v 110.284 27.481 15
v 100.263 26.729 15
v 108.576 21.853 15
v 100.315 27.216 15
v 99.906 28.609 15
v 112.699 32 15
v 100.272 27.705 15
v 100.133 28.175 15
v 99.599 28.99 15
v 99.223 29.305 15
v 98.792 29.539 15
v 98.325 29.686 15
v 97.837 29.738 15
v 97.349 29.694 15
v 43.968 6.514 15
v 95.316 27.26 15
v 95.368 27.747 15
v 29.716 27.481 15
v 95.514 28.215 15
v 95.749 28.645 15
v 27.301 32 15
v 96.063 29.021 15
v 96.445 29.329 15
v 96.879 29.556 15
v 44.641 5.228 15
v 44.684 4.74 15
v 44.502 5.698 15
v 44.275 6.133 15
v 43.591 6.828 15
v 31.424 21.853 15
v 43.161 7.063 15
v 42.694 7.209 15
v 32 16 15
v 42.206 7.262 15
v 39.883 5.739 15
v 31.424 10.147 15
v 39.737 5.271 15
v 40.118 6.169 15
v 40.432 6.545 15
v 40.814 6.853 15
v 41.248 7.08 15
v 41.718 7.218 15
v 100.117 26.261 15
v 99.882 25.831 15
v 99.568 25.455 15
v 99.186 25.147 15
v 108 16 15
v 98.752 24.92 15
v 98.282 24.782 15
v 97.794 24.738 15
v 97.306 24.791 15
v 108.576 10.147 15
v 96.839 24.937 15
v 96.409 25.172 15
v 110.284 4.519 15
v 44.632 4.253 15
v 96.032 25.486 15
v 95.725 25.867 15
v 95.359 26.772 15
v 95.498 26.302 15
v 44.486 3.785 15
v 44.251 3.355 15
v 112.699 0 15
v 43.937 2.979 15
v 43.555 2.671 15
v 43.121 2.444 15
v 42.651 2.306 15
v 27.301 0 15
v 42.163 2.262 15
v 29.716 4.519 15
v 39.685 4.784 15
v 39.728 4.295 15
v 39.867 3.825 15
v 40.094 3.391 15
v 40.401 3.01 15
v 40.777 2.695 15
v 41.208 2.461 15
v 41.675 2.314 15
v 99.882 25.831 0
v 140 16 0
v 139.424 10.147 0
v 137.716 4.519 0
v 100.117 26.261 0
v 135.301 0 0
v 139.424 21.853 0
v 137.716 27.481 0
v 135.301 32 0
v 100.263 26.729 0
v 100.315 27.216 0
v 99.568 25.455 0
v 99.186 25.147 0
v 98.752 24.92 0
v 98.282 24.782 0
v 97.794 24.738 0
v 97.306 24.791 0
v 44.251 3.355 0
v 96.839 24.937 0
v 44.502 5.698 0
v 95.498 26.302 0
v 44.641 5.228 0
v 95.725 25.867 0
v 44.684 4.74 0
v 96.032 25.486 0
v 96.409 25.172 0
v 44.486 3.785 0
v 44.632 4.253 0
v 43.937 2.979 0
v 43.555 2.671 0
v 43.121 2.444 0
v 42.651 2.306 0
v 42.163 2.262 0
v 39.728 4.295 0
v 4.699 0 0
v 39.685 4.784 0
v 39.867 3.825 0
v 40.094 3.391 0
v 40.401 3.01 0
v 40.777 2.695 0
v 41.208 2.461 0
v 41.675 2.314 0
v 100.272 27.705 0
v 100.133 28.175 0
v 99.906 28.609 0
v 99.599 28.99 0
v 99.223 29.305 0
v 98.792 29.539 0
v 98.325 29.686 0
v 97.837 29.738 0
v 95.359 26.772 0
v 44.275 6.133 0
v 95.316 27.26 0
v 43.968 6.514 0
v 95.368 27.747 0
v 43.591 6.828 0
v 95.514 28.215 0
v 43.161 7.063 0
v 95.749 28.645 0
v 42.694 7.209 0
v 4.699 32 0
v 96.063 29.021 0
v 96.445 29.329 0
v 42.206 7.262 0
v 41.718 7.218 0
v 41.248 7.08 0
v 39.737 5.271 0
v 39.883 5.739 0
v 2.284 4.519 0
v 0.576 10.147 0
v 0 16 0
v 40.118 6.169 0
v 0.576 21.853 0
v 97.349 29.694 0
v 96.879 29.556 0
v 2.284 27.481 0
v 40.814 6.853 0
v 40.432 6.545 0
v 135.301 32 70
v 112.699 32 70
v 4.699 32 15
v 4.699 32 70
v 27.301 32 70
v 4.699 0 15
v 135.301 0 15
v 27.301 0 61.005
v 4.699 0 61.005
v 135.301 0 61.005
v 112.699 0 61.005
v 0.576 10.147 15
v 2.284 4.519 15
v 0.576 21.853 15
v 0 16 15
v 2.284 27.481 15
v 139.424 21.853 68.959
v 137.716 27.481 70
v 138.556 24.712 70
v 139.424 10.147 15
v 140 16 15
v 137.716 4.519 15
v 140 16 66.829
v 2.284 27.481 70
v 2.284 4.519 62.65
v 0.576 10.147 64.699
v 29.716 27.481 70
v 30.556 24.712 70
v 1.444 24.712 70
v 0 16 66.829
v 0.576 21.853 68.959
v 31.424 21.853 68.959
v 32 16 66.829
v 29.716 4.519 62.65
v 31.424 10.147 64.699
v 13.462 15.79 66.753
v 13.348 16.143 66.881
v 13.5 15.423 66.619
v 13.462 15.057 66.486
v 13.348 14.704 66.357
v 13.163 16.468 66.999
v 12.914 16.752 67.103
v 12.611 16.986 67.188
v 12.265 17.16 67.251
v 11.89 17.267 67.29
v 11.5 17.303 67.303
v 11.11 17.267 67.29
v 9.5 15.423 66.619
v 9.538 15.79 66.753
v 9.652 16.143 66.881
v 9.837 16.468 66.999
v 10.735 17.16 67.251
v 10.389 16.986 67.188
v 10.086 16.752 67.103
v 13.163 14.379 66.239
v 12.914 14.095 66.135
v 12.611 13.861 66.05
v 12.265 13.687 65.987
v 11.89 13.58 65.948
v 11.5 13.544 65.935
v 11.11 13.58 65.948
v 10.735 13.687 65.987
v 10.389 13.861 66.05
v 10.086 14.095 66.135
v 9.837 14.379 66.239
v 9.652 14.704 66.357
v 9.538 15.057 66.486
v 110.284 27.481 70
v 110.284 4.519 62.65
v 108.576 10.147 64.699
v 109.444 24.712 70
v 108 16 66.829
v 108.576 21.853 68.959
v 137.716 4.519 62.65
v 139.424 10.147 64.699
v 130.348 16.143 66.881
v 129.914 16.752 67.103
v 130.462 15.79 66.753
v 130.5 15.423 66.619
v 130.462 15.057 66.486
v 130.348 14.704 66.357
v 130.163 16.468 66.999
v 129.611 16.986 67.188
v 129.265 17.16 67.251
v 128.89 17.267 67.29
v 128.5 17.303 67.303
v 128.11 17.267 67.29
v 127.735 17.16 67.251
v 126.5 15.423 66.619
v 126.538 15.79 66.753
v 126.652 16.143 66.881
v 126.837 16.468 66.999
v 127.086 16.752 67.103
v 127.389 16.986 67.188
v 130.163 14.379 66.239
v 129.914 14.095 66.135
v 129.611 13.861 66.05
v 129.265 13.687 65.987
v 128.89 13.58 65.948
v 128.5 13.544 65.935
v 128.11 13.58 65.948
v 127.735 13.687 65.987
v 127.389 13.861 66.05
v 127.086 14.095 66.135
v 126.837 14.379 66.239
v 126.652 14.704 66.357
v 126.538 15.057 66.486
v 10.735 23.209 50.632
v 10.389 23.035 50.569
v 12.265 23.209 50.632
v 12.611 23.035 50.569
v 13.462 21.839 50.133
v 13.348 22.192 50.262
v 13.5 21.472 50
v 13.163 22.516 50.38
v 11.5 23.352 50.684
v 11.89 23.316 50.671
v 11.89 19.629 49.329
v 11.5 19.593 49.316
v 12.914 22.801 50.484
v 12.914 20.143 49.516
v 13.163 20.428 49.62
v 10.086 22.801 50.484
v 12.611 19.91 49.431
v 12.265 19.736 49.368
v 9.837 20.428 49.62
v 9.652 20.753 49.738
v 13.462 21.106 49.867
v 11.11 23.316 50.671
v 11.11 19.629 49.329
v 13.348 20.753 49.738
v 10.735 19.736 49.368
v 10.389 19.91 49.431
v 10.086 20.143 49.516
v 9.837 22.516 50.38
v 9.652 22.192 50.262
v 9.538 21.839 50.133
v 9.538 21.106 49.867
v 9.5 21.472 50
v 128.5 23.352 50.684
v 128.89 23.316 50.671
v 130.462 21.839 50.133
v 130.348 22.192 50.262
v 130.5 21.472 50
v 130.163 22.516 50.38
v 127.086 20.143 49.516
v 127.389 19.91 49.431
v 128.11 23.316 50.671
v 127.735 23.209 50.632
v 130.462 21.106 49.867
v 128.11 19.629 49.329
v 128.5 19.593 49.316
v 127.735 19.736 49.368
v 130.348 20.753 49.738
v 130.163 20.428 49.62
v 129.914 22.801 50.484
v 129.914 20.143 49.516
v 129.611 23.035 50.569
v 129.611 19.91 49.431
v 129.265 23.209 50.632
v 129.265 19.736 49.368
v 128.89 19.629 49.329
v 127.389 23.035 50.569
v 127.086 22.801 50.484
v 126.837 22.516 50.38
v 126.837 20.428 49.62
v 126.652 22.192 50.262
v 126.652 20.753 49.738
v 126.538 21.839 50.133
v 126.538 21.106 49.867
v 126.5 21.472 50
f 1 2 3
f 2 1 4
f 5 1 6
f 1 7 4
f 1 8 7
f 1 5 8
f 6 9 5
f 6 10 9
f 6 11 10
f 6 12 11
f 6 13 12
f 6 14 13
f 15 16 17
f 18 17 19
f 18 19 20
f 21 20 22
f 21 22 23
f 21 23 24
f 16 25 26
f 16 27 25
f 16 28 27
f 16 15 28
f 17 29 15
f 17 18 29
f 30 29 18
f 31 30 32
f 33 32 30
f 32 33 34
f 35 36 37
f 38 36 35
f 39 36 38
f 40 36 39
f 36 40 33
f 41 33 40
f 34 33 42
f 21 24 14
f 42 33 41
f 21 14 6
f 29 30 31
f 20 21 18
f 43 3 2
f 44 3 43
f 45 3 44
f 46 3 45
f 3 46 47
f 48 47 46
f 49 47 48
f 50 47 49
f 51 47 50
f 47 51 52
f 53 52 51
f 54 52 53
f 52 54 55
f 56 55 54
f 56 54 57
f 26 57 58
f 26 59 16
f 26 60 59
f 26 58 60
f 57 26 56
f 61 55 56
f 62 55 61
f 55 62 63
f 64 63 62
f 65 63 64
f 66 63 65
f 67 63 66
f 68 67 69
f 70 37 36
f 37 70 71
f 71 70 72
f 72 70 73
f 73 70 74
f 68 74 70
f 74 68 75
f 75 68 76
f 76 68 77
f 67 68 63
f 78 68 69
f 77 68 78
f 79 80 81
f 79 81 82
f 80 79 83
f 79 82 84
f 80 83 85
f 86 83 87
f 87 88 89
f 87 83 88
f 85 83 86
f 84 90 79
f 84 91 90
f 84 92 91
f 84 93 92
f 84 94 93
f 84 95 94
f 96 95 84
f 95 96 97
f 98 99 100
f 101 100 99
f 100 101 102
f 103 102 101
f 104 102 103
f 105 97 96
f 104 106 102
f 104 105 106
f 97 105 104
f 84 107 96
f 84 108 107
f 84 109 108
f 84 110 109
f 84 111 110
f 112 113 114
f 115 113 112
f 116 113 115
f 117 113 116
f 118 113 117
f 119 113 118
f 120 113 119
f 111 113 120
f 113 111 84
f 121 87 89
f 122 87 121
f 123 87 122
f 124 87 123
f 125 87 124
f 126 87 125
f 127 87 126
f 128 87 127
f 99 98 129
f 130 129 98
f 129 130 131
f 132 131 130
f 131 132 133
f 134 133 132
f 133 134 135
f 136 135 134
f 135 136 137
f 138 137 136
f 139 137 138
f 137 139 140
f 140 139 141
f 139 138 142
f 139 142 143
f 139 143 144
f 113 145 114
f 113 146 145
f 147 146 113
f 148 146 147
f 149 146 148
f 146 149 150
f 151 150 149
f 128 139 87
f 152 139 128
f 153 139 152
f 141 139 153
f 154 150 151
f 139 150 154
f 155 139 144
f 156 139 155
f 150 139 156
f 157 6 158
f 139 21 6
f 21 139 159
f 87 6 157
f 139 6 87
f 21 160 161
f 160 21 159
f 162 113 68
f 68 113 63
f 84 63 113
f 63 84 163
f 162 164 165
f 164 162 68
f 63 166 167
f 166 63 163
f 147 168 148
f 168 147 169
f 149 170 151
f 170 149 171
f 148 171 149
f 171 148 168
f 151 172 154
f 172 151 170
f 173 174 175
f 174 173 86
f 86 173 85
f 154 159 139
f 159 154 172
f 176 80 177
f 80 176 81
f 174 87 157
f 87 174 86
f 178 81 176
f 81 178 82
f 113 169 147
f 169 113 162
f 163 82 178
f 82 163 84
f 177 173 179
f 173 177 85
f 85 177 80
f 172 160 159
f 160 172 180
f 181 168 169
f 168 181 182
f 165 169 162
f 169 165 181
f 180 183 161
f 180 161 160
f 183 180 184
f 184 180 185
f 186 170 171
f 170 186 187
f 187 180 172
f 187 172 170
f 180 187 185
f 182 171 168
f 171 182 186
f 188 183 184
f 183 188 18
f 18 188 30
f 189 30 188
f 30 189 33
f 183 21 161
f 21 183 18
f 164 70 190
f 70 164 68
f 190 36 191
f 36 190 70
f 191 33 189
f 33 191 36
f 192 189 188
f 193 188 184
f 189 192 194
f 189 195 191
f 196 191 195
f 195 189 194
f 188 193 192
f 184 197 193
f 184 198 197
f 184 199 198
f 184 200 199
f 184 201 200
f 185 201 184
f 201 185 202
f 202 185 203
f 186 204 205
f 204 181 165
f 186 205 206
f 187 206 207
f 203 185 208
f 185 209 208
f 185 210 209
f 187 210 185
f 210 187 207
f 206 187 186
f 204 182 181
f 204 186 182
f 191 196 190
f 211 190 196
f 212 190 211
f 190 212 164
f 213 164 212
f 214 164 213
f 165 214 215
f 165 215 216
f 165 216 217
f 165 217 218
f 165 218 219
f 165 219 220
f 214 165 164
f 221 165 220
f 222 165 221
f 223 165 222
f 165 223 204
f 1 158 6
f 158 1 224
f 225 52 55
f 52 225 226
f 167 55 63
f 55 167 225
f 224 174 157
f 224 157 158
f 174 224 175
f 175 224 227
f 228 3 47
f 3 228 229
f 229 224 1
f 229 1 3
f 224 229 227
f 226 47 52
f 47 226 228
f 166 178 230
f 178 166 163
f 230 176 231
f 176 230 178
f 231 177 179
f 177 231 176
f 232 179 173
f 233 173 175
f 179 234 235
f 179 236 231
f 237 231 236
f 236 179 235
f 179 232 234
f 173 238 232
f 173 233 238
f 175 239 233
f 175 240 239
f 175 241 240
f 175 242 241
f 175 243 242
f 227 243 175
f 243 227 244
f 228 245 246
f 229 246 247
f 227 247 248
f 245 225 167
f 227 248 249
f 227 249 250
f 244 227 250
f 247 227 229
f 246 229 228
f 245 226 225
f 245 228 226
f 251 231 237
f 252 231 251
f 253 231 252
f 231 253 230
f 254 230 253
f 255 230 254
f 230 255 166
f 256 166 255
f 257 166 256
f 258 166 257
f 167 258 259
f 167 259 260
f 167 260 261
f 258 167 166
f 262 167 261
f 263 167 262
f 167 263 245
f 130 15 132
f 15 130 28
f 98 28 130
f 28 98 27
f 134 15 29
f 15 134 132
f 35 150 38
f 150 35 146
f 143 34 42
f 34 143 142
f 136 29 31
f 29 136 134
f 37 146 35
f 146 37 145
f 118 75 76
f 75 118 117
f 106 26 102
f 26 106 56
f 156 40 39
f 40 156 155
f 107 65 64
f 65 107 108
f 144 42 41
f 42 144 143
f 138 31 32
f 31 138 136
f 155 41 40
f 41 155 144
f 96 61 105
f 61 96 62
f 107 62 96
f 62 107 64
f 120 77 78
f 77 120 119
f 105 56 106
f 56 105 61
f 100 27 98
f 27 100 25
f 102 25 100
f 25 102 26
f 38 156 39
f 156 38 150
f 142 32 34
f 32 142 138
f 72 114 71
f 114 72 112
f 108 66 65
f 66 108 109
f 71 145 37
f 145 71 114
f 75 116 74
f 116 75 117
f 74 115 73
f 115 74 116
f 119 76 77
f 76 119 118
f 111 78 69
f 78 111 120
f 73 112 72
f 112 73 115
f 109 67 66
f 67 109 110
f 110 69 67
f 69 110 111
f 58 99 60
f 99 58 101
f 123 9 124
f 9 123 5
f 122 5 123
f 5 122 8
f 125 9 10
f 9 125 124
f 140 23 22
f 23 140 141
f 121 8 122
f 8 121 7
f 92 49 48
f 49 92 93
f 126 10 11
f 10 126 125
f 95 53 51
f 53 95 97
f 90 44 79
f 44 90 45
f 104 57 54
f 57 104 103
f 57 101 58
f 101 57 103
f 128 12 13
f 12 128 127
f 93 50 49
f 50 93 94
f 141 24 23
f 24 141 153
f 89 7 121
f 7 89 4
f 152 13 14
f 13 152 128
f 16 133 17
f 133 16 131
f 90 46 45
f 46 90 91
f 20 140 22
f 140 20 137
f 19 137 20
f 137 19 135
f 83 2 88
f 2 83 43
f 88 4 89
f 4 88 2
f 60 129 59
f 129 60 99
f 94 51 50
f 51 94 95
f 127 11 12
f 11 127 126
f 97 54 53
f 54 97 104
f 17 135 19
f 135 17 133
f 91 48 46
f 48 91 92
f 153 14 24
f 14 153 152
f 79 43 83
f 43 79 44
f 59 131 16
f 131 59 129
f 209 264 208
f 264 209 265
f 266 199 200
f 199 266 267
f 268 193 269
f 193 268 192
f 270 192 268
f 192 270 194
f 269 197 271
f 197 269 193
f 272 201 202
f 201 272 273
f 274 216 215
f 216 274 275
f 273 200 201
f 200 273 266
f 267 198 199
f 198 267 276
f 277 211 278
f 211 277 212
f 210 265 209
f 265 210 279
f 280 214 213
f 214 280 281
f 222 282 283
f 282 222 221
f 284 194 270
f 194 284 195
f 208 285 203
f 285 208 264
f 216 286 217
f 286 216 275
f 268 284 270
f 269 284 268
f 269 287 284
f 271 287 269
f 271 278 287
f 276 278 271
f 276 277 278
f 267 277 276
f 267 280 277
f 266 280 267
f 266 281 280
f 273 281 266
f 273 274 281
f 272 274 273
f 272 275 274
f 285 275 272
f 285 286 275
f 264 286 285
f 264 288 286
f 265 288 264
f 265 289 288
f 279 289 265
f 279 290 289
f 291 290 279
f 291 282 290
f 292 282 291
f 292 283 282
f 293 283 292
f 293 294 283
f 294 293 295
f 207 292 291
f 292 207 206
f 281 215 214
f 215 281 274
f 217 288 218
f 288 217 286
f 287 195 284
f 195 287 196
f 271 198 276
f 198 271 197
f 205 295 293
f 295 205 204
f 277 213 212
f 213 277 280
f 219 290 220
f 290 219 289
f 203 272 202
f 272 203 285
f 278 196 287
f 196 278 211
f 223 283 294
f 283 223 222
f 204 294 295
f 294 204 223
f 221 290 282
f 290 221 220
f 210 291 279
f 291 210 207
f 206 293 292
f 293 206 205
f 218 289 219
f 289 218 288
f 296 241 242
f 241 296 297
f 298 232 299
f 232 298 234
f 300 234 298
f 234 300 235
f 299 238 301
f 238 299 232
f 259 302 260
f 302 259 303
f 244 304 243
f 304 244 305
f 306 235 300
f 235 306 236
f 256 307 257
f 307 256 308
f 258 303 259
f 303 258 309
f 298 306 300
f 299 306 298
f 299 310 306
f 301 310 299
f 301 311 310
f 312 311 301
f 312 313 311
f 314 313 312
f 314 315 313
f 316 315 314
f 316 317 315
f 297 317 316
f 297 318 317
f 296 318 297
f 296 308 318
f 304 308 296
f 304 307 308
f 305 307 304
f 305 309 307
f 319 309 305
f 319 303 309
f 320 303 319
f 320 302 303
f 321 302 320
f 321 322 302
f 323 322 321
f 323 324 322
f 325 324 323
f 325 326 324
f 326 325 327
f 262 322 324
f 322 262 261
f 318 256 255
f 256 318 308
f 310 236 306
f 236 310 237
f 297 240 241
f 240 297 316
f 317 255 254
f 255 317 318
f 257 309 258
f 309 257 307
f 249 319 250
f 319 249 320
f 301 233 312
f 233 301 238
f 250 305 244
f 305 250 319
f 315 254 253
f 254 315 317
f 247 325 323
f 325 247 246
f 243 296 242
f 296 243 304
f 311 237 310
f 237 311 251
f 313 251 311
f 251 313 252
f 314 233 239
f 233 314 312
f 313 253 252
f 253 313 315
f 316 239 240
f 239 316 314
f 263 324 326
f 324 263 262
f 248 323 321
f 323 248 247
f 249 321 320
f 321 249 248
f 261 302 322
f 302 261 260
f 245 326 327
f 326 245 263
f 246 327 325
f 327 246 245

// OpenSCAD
include <../libs/pw_primitives.scad>;

$fn = 32;

width = 32;
length = 140;
height_1 = 15;
height_2 = 70;
base_round_r = 30;
base_hole_sep = 60;
base_hole_diam = 5;
base_hole_ang = 22;
tower_r = 32/2;
top_hole_sep = 117;
top_hole_diam = 4;
top_face_ang = 20;
top_hole_depth = 20;

difference() {
    union() {
        // base
        intersection() {
            cube([length, width, height_1]);
            translate([0, width/2, -0.01]) hull() {
                translate([base_round_r, 0, 0])
                  cylinder(r=base_round_r, h=height_1+0.02);
                translate([length-base_round_r, 0, 0]) 
                  cylinder(r=base_round_r, h=height_1+0.02);
            };
        }
        // lh tower
        translate([tower_r, width/2, 0]) intersection() {
            translate([base_round_r-tower_r, 0, 0]) cylinder(r=base_round_r, h=height_2);
            translate([tower_r-base_round_r, 0, 0]) cylinder(r=base_round_r, h=height_2);
            translate([-tower_r, -width/2, 0]) cube([tower_r*2, width, height_2]);
            translate([-tower_r, -(sin(top_face_ang)*width), 0]) rotate([top_face_ang, 0, 0]) 
              cube([tower_r*2, width*2, height_2-sin(top_face_ang)*width]);
        }
        // rh tower
        translate([length-tower_r, width/2, 0]) intersection() {
            translate([base_round_r-tower_r, 0, 0]) cylinder(r=base_round_r, h=height_2);
            translate([tower_r-base_round_r, 0, 0]) cylinder(r=base_round_r, h=height_2);
            translate([-tower_r, -width/2, 0]) cube([tower_r*2, width, height_2]);
            translate([-tower_r, -(sin(top_face_ang)*width), 0]) rotate([top_face_ang, 0, 0]) 
              cube([tower_r*2, width*2, height_2-sin(top_face_ang)*width]);
        }
    }
    // minus base holes
    translate([length/2, width/2, -0.01]) rotate([0, 0, base_hole_ang]) union() {
        translate([-base_hole_sep/2, 0, 0]) cylinder(d=base_hole_diam, h=height_1+0.02);
        translate([base_hole_sep/2, 0, 0]) cylinder(d=base_hole_diam, h=height_1+0.02);
    }
    // minus top holes
    translate([length/2, (width+sin(top_face_ang)*width)/2, height_2-top_hole_depth]) 
    rotate([top_face_ang, 0, 0]) union() {
        translate([-top_hole_sep/2, 0, 0]) cylinder(d=top_hole_diam, h=top_hole_depth);
        translate([top_hole_sep/2, 0, 0]) cylinder(d=top_hole_diam, h=top_hole_depth);
    }
}
